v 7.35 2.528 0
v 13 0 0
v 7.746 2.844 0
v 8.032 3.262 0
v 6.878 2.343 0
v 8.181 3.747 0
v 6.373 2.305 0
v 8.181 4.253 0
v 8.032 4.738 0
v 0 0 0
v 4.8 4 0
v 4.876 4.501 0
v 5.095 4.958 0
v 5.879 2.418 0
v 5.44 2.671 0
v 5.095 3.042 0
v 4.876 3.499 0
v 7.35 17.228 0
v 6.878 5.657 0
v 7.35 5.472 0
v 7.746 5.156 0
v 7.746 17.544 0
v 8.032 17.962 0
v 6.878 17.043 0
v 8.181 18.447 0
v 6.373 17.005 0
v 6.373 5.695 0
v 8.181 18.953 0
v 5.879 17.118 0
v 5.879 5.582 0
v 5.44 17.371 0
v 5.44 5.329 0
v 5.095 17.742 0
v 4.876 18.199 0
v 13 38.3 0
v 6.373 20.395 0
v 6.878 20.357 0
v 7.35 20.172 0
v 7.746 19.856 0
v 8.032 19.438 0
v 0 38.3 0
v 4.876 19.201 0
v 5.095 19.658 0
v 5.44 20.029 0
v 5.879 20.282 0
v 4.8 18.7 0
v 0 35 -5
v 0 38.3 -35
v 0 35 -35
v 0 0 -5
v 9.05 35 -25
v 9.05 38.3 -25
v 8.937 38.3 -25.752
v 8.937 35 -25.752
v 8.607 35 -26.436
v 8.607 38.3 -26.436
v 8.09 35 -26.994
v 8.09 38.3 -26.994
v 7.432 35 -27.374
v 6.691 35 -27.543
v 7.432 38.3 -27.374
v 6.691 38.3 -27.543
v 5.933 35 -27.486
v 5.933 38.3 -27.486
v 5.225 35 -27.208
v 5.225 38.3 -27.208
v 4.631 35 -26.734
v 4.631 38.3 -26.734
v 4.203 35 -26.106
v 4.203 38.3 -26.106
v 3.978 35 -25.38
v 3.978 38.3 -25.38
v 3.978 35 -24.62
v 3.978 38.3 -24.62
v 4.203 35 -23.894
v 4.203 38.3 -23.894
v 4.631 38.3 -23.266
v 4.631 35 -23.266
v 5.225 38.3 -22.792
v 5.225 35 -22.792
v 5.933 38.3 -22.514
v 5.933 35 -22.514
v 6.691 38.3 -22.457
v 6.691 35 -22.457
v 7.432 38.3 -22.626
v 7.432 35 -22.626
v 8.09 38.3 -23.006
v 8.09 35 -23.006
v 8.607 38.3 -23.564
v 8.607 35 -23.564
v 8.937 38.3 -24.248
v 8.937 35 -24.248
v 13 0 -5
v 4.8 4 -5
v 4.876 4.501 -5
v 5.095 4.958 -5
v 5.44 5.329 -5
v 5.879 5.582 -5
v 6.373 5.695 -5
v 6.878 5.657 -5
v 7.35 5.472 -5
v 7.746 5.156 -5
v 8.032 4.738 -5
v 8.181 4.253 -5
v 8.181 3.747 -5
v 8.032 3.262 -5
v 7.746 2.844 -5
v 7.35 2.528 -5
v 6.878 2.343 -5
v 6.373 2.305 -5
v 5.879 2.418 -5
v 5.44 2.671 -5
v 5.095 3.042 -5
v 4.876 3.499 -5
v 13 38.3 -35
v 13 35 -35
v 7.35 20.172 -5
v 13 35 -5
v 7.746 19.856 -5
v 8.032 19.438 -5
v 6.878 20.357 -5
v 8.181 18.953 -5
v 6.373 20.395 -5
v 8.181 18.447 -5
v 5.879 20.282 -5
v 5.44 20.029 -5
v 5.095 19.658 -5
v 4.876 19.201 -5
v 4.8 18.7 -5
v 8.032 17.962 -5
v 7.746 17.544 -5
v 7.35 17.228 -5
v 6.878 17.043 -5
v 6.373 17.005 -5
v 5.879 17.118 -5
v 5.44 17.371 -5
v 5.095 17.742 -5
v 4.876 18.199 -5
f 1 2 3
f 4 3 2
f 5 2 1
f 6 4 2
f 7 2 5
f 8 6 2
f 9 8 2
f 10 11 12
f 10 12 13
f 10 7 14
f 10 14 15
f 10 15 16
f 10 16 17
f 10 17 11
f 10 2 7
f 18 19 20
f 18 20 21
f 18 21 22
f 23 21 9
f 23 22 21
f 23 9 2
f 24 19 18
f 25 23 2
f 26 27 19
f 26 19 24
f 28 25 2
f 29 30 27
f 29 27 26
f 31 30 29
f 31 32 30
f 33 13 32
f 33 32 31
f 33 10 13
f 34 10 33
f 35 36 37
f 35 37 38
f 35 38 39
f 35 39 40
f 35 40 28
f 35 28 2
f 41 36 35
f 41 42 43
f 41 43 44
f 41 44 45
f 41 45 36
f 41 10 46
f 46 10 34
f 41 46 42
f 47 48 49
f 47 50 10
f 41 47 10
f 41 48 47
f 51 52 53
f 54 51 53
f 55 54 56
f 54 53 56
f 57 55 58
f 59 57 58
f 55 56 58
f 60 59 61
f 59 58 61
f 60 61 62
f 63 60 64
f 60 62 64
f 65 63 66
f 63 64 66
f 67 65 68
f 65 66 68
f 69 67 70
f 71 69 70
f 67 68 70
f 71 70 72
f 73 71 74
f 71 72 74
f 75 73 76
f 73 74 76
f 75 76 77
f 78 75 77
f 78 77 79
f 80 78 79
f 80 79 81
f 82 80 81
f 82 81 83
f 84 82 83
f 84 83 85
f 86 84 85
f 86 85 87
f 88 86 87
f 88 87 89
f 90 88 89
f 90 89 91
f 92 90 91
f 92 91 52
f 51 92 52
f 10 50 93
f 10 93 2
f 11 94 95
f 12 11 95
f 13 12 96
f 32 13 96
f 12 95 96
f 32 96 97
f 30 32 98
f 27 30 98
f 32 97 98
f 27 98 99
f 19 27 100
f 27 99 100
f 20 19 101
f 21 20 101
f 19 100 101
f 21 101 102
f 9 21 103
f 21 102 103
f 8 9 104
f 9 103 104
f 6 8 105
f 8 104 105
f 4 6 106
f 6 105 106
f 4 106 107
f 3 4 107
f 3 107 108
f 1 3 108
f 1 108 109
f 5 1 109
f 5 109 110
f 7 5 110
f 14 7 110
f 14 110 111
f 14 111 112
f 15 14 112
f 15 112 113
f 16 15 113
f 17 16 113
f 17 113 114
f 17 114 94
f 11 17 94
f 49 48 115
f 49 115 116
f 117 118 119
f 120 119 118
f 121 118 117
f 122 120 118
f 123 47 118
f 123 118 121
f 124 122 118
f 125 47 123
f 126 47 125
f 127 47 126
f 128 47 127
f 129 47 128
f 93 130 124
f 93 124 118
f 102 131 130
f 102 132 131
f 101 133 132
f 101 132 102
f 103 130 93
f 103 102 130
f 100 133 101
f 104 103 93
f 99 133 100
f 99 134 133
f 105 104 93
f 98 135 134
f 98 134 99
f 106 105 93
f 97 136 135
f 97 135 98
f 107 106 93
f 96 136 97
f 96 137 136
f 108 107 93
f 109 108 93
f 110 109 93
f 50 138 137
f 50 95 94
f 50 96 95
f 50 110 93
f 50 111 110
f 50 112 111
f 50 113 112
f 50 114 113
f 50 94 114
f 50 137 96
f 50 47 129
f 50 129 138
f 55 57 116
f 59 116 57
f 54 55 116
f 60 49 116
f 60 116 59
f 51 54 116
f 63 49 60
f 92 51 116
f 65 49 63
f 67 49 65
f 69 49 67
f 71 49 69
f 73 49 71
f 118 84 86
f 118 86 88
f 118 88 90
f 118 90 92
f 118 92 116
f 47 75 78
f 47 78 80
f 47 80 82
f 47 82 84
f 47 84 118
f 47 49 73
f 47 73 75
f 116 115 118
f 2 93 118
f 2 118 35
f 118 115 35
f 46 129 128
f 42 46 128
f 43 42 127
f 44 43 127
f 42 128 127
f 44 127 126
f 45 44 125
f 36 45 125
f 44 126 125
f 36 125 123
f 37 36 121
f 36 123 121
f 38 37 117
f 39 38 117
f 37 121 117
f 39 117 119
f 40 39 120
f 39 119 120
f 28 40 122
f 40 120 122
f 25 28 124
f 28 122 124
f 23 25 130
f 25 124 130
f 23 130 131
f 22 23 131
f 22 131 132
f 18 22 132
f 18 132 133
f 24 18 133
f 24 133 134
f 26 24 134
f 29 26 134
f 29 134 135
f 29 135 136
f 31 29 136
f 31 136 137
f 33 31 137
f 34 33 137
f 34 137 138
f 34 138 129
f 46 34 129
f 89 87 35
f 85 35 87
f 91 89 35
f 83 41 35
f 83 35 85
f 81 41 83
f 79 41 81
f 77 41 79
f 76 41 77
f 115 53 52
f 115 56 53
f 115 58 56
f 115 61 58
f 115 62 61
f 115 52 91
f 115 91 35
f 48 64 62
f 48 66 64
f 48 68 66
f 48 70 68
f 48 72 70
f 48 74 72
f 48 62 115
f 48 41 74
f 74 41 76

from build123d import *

# Parameters (mm, degrees)
BOSS_EXTRUDE1_DEPTH = 13
SKETCH2_R           = 1.7
CUT_EXTRUDE1_DEPTH  = 6
SKETCH3_R           = 2.55
CUT_EXTRUDE2_DEPTH  = 39.3


with BuildPart() as part:
    # Sketch1 → Boss-Extrude1 (new body)
    with BuildSketch(Plane(origin=(0, 0, 0), x_dir=(0, 0, -1), z_dir=(1, 0, 0))):
        Polygon((0, 0), (0, 38.3), (35, 38.3), (35, 35), (5, 35), (5, 0), align=None)
    extrude(amount=BOSS_EXTRUDE1_DEPTH)

    # Sketch2 → Cut-Extrude1 (cut, through all)
    with BuildSketch(Plane(origin=(0, 0, -5), x_dir=(-1, 0, 0), z_dir=(0, 0, -1))):
        with Locations((-6.5, 18.7)):
            Circle(SKETCH2_R)
        with Locations((-6.5, 4)):
            Circle(SKETCH2_R)
    extrude(amount=-CUT_EXTRUDE1_DEPTH, mode=Mode.SUBTRACT)

    # Sketch3 → Cut-Extrude2 (cut, through all)
    with BuildSketch(Plane(origin=(0, 38.3, 0), x_dir=(1, 0, 0), z_dir=(0, 1, 0))):
        with Locations((6.5, 25)):
            Circle(SKETCH3_R)
    extrude(amount=-CUT_EXTRUDE2_DEPTH, mode=Mode.SUBTRACT)


solid = part.part
